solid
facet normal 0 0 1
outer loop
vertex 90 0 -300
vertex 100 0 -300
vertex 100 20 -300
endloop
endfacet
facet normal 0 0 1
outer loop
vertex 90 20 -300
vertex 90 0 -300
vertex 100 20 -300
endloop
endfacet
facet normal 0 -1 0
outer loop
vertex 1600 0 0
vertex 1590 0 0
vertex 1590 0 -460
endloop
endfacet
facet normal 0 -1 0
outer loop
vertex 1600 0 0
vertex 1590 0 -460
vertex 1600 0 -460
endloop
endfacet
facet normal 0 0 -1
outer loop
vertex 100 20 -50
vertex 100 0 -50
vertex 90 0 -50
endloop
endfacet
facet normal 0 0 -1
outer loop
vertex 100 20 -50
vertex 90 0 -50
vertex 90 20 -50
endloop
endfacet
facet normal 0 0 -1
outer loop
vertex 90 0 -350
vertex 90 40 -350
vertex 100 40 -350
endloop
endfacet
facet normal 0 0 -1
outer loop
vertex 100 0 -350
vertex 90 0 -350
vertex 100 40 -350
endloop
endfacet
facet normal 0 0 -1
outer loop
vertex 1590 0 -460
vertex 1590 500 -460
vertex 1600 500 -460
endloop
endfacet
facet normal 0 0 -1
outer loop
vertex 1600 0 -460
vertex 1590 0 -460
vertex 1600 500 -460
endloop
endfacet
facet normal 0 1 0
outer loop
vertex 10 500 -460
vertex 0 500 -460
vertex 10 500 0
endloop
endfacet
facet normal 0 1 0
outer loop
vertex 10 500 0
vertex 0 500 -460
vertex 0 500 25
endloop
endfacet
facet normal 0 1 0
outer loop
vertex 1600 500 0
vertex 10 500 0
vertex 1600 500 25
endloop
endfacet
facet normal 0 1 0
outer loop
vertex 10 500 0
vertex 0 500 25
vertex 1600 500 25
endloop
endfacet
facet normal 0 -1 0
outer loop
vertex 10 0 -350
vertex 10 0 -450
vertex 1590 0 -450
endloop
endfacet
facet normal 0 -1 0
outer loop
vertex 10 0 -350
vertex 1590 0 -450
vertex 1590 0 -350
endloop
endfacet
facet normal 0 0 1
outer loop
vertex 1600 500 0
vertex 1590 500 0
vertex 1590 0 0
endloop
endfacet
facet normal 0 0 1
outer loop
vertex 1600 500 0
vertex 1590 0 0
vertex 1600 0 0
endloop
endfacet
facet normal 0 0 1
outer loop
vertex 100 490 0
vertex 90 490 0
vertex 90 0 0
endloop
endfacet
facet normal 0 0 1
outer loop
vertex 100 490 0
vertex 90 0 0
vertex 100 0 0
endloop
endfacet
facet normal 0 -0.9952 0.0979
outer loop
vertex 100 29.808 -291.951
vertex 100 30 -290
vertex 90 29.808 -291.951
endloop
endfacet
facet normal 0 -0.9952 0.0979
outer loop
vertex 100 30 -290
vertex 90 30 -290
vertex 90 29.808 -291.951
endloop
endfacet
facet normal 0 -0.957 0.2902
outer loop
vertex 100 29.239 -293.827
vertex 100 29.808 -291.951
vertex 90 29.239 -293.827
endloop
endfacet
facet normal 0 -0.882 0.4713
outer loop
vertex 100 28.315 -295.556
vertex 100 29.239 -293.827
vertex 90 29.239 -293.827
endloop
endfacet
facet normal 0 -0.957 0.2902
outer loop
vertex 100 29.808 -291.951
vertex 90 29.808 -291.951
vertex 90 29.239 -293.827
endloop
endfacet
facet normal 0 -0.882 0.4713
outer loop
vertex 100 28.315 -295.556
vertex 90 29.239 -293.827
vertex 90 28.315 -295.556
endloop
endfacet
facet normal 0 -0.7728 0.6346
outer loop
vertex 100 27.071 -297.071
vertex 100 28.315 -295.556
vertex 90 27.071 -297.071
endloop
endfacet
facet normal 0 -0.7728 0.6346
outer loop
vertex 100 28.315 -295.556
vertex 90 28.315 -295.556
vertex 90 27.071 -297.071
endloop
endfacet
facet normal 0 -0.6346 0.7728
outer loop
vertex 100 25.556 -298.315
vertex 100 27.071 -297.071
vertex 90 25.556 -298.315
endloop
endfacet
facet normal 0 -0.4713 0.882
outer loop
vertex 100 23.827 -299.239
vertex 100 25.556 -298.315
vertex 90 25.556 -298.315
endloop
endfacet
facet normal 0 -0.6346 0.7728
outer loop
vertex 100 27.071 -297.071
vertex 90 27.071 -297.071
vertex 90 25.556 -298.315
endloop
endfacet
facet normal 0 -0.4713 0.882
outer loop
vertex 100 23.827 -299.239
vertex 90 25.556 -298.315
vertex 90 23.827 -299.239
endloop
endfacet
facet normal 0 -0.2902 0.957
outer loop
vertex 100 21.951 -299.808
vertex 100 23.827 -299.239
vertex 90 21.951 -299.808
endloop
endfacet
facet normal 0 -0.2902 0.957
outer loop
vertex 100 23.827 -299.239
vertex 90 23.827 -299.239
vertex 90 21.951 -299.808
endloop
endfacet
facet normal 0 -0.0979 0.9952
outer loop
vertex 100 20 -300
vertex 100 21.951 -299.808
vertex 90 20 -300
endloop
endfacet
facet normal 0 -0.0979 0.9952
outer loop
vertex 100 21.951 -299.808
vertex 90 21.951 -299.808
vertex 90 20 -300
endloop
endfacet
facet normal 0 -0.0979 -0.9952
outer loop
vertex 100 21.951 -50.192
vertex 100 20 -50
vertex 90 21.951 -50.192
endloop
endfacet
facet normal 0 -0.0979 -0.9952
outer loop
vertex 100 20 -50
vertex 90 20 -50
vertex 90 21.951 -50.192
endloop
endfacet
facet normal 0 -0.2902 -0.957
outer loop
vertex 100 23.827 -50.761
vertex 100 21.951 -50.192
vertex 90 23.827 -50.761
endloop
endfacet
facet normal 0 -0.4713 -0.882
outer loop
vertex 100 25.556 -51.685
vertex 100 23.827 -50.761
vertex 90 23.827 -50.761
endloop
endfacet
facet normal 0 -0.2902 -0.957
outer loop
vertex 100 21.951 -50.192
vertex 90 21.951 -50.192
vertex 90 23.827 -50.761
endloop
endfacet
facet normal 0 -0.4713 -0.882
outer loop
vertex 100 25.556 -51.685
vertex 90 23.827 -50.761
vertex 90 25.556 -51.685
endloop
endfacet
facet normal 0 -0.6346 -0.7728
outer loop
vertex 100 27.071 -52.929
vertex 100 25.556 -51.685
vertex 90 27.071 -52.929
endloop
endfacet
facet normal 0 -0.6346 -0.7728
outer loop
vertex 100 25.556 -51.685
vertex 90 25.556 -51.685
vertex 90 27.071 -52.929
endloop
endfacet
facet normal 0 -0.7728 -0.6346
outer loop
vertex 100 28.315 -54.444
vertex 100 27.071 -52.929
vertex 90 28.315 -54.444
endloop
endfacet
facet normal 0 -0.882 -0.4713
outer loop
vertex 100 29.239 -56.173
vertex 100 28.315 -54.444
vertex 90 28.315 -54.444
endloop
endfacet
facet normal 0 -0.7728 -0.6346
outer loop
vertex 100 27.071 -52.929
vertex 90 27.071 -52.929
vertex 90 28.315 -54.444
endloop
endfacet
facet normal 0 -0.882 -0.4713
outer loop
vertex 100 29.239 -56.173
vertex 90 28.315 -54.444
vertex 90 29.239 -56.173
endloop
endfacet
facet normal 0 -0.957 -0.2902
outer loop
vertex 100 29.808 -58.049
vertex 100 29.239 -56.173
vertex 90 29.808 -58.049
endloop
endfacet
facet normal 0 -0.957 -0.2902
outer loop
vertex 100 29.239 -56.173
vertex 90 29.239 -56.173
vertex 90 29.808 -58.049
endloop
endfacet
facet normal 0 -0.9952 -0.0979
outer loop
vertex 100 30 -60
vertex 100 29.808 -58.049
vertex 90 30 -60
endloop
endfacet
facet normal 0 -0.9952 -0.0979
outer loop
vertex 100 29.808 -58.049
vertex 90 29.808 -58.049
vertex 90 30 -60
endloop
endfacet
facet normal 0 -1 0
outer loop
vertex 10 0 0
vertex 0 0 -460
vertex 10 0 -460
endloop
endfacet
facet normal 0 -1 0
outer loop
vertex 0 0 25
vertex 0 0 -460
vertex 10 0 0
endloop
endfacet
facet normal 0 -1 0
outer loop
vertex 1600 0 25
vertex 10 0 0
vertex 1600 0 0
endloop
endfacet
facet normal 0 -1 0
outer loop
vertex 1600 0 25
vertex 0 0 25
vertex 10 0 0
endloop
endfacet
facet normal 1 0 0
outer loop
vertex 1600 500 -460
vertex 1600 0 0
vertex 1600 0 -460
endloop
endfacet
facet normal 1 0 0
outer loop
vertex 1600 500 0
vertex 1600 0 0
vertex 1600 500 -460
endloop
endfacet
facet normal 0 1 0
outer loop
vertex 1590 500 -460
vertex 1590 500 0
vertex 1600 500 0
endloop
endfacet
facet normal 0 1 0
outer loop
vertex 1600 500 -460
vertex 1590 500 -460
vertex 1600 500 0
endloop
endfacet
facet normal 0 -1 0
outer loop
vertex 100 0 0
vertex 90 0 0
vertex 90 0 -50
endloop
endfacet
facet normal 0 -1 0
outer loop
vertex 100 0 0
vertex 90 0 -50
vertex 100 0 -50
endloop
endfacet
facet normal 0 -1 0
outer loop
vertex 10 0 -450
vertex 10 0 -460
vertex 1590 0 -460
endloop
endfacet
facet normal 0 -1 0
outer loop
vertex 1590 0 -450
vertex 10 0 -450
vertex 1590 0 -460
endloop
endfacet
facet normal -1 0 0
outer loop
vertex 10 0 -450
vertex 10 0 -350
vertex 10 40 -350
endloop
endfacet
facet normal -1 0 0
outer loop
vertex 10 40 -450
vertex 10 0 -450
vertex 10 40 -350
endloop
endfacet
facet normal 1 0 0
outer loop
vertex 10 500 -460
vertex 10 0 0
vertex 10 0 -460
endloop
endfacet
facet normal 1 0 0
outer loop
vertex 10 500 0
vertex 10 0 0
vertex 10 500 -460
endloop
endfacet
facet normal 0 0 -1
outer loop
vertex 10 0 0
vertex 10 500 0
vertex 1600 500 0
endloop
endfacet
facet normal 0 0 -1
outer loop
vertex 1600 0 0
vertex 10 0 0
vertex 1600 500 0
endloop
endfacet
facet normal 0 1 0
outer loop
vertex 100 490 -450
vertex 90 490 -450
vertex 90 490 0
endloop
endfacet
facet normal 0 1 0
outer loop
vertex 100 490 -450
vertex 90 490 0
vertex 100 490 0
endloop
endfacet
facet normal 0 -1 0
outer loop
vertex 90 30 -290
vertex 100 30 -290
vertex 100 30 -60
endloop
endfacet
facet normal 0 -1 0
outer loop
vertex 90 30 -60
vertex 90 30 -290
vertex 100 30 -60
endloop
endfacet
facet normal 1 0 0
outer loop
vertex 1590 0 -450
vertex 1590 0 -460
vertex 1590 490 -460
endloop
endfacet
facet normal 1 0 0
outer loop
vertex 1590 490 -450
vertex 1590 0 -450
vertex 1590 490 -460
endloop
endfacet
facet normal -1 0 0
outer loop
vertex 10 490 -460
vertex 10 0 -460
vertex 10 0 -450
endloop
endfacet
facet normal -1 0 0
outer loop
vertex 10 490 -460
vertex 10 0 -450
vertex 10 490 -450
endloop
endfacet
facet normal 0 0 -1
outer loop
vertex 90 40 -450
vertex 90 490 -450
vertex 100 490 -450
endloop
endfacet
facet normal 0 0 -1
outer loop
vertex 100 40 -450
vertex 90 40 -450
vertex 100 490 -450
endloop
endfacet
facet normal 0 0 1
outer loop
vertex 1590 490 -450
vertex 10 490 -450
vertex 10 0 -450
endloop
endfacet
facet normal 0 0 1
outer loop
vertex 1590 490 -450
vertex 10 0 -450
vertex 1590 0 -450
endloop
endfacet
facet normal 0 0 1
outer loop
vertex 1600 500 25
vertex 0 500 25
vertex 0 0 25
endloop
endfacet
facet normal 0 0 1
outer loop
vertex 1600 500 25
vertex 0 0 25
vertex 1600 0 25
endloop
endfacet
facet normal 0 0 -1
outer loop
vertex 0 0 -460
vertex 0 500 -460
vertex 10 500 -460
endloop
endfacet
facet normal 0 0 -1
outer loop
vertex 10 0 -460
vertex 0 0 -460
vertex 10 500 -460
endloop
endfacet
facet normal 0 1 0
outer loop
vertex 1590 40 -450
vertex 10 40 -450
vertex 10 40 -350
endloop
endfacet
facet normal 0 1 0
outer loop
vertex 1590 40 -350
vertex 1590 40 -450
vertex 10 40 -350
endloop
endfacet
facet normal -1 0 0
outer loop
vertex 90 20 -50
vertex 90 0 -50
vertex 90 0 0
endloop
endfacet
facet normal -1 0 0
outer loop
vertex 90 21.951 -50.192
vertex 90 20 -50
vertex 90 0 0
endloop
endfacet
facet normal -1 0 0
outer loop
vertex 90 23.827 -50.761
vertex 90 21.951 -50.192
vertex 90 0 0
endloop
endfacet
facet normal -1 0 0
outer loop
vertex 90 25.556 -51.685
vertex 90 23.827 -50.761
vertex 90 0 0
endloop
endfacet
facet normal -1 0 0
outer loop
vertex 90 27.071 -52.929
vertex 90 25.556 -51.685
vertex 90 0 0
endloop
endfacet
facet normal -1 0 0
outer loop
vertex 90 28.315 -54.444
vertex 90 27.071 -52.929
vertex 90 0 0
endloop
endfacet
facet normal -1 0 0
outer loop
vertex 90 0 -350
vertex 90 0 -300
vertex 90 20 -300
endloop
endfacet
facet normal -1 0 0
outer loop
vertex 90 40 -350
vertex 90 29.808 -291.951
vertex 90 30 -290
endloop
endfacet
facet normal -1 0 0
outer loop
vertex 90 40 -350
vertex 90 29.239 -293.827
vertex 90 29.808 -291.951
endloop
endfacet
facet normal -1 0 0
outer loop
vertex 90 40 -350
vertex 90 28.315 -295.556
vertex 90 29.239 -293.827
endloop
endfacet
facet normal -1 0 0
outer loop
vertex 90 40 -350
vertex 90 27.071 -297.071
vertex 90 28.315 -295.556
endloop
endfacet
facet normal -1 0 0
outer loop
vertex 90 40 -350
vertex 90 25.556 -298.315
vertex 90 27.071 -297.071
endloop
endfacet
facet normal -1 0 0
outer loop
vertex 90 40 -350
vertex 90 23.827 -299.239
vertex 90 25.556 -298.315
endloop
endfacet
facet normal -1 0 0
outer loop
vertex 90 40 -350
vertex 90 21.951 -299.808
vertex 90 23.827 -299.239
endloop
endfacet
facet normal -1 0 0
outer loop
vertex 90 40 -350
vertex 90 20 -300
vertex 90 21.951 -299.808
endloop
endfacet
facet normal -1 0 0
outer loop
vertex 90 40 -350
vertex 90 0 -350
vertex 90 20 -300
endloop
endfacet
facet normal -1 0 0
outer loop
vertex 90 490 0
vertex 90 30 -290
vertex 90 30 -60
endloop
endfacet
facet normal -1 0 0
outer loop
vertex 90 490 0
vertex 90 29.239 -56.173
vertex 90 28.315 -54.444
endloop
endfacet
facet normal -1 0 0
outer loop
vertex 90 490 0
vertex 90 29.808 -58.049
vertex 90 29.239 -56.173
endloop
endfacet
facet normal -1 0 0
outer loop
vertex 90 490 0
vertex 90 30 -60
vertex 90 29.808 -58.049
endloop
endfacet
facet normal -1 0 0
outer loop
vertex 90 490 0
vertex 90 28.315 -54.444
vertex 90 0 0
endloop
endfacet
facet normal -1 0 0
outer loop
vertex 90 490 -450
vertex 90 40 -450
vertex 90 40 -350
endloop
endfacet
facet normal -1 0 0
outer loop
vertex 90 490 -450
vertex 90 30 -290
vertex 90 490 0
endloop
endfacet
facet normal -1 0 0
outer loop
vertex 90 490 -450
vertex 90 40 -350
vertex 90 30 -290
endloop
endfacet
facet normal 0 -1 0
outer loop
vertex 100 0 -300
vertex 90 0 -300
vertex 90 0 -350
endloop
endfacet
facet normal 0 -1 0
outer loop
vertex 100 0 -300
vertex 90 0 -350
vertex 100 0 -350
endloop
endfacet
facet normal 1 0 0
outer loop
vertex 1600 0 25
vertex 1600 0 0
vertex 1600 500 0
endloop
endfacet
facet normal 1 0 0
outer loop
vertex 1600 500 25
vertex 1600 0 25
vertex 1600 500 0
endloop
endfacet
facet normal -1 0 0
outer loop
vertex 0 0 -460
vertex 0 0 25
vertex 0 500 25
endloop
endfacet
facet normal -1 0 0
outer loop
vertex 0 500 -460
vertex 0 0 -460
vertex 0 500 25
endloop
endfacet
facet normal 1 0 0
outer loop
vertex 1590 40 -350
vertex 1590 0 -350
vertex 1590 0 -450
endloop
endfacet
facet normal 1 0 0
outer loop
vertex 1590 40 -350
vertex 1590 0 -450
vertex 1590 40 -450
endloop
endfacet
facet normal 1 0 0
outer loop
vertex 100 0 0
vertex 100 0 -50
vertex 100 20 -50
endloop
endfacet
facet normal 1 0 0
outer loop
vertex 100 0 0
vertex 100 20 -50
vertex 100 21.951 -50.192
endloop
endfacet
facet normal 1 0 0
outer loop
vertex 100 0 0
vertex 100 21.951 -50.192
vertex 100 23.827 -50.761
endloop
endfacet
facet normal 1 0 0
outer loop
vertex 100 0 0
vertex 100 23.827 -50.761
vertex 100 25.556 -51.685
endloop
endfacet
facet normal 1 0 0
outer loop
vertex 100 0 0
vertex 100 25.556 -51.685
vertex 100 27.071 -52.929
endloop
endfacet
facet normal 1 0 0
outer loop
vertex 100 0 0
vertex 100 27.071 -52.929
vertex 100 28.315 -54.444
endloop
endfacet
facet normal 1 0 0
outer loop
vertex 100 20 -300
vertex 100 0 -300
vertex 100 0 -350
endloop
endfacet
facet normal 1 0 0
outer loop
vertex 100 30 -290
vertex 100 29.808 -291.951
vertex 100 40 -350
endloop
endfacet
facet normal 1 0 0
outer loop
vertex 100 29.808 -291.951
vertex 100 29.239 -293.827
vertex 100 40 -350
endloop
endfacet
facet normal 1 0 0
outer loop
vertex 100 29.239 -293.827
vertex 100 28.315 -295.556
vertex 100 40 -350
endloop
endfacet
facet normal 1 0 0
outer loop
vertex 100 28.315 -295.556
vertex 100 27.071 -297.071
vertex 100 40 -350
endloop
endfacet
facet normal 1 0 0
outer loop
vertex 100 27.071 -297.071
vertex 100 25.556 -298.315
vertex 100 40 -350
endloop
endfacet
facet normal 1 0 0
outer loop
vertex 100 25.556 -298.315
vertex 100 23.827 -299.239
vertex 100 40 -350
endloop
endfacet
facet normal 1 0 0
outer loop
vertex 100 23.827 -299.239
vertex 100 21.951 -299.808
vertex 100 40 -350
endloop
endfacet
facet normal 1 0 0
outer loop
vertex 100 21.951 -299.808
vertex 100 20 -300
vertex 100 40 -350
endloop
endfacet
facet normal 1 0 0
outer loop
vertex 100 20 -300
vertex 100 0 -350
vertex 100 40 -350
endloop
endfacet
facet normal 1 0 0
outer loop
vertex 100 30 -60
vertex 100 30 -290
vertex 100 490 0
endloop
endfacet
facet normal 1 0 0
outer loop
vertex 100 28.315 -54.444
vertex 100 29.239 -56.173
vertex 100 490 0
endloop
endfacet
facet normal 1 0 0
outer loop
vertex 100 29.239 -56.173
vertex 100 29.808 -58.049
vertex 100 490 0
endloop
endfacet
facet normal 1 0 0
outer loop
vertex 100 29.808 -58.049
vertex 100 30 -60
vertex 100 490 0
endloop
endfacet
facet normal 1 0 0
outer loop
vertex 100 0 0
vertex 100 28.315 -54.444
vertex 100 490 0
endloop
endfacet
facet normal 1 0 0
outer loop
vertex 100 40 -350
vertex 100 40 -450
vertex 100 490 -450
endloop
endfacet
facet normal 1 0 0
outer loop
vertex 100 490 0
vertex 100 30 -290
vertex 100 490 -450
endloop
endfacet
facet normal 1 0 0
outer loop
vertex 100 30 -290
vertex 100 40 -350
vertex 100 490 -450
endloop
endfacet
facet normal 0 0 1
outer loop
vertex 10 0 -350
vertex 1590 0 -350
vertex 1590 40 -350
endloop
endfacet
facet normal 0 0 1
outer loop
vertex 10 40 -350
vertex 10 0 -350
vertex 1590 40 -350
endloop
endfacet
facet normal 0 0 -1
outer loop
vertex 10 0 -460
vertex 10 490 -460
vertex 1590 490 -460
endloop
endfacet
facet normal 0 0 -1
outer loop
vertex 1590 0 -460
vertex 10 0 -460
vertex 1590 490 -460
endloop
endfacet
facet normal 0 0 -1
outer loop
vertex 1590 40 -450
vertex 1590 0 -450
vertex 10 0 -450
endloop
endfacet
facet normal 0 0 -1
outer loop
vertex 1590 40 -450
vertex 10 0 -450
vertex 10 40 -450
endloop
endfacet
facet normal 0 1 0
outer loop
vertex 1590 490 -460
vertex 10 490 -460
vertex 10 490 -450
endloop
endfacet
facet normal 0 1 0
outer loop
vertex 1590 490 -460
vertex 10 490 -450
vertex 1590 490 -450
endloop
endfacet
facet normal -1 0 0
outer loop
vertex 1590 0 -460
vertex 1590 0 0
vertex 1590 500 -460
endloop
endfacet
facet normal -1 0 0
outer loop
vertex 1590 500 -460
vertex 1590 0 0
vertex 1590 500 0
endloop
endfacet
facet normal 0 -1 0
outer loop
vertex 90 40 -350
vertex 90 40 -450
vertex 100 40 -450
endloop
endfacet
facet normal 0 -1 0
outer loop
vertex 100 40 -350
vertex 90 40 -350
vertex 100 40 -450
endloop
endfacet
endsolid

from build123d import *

# Parameters (mm, degrees)
F0_W      = 1600
F0_H      = 500
F1_DEPTH  = 25
F3_W      = 1580
F3_H      = 490
F4_DEPTH  = 10
F5_W      = 10
F5_H      = 500
F6_DEPTH  = 460
F7_W      = 10
F7_H      = 500
F8_DEPTH  = 460
F9_W      = 40
F9_H      = 100
F10_DEPTH = 1580
F11_W     = 10
F11_H     = 450
F12_DEPTH = 450
F13_W     = 10
F13_H     = 350
F14_DEPTH = 40
F16_W     = 30
F16_H     = 250
F17_DEPTH = 100.001
F18_R     = 10


with BuildPart() as f1:
    # F0 (on Top) → F1 (new body)
    with BuildSketch(Plane.XY):
        with Locations((800, 250)):
            Rectangle(F0_W, F0_H)
    extrude(amount=F1_DEPTH)

    # F5 (on face) → F6 (join, through all)
    with BuildSketch(Plane.XY):
        with Locations((5, 250)):
            Rectangle(F5_W, F5_H)
    extrude(amount=-F6_DEPTH)


with BuildPart() as f4:
    # F3 (on offset) → F4 (new body)
    with BuildSketch(Plane.XY.offset(-460)):
        with Locations((800, 245)):
            Rectangle(F3_W, F3_H)
    extrude(amount=F4_DEPTH)


with BuildPart() as f8:
    # F7 (on face) → F8 (new body, through all)
    with BuildSketch(Plane.XY):
        with Locations((1595, 250)):
            Rectangle(F7_W, F7_H)
    extrude(amount=-F8_DEPTH)


with BuildPart() as f10:
    # F9 (on face) → F10 (new body, through all)
    with BuildSketch(Plane.YZ.offset(10)):
        with Locations((20, -400)):
            Rectangle(F9_W, F9_H)
    extrude(amount=F10_DEPTH)


with BuildPart() as f12:
    # F11 (on face) → F12 (new body, through all)
    with BuildSketch(Plane.XY.offset(-450)):
        with Locations((95, 265)):
            Rectangle(F11_W, F11_H)
    extrude(amount=F12_DEPTH)


with BuildPart() as f14:
    # F13 (on face) → F14 (new body, through all)
    with BuildSketch(Plane.XZ.offset(-40)):
        with Locations((95, -175)):
            Rectangle(F13_W, F13_H)
    extrude(amount=F14_DEPTH)

    # F15: union F12
    add(f12.part)

    # F16 (on face) → F17 (cut, through all)
    with BuildSketch(Plane.YZ.offset(100)):
        with Locations((15, -175)):
            Rectangle(F16_W, F16_H)
    extrude(amount=-F17_DEPTH, mode=Mode.SUBTRACT)

    # F18
    f18_edges = [f14.edges().sort_by_distance(p)[0] for p in [
        (95, 30, -50),
        (95, 30, -300),
    ]]
    fillet(f18_edges, radius=F18_R)


solid = Compound([f1.part, f4.part, f8.part, f10.part, f14.part])
